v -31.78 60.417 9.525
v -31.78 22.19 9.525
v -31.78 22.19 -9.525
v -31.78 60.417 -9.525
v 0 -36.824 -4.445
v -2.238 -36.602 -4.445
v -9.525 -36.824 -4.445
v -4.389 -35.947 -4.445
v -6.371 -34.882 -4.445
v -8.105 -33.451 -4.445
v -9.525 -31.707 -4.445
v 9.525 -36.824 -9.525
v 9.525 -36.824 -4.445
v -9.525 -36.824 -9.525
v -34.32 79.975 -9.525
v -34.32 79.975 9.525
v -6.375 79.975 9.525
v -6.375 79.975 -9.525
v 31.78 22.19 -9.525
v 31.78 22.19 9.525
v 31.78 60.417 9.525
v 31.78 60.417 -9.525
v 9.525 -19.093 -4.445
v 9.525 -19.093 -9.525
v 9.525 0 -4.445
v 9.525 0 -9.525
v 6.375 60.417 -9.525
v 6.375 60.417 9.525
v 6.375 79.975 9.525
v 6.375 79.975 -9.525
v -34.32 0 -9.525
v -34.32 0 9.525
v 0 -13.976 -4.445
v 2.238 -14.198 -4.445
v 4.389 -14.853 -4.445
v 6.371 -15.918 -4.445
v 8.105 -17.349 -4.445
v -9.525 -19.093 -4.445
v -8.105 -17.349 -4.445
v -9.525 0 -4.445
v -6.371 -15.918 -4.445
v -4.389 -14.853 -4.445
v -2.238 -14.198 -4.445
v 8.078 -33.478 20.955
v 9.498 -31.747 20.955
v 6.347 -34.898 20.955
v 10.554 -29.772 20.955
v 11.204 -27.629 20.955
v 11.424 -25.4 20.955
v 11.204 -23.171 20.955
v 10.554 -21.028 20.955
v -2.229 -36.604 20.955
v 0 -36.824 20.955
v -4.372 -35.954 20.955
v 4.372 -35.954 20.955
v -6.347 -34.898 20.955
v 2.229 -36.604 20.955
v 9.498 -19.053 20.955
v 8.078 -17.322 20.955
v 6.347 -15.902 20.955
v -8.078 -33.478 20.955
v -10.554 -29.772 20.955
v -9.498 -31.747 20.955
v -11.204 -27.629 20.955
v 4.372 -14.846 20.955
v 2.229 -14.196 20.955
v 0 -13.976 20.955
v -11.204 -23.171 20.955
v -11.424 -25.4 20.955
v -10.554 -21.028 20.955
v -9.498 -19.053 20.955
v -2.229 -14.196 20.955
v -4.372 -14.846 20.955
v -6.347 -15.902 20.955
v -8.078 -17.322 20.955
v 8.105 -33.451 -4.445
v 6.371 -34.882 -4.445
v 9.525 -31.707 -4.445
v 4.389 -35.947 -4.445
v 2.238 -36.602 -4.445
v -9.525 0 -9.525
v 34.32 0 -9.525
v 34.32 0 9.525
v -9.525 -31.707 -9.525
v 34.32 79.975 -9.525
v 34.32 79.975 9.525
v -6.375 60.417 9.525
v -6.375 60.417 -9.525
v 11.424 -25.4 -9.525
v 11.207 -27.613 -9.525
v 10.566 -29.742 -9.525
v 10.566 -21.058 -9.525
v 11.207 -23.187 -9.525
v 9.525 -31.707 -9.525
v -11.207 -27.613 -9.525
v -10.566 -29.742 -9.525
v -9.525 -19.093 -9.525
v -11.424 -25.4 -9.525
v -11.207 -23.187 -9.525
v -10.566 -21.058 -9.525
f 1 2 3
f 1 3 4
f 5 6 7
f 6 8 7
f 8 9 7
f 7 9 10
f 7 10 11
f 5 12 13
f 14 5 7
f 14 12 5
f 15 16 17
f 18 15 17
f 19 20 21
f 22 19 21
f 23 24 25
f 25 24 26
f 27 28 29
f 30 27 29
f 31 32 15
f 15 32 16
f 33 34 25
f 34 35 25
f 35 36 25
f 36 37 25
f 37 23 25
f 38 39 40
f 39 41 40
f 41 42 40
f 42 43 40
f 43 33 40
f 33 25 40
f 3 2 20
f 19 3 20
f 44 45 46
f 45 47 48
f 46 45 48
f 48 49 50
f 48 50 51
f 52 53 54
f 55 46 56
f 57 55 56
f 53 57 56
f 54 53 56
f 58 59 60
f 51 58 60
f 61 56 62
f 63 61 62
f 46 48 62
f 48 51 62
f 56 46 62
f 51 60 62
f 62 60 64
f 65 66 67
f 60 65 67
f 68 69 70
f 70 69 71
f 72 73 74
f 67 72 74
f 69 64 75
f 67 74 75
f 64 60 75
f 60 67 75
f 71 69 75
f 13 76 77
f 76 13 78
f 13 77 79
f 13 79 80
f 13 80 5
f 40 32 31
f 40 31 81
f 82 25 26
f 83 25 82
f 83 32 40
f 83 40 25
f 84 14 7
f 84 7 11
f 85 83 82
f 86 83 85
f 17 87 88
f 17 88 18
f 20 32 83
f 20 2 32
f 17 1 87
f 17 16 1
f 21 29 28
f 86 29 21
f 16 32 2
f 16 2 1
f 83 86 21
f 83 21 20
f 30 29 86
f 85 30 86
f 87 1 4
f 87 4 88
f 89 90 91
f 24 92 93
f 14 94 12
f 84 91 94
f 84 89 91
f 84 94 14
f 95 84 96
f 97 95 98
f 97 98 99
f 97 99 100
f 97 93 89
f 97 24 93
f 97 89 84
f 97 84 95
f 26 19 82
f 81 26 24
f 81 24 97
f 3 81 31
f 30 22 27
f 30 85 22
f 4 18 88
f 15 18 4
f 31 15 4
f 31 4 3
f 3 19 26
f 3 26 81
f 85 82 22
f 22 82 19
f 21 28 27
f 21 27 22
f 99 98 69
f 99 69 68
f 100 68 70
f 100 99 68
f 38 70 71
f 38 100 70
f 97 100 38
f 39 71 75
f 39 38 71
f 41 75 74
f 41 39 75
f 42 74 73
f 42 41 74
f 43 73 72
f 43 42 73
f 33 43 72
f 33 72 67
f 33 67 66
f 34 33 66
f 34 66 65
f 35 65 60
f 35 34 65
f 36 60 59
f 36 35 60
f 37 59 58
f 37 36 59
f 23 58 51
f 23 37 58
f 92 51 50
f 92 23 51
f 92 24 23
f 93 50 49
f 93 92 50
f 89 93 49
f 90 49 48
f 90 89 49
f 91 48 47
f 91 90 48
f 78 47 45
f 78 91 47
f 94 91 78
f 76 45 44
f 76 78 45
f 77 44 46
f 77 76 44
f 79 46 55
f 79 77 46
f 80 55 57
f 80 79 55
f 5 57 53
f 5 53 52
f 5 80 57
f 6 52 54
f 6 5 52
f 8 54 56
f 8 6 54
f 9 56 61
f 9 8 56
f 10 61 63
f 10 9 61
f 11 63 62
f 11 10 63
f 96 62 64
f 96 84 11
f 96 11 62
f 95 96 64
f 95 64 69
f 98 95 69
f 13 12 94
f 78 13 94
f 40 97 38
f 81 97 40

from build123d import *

# Parameters (mm, degrees)
SKETCH1_W            = 68.64096
SKETCH1_H            = 79.975020836
MAIN_BODY_DEPTH      = 9.525
SKETCH2_W            = 63.56096
SKETCH2_H            = 38.227
LOWER_T_CAVITY_DEPTH = 90.088729956
SKETCH3_W            = 12.7508
SKETCH3_H            = 19.558
TOP_SLOT_DEPTH       = 90.088729956
SKETCH4_W            = 19.05
SKETCH4_H            = 36.82365
HANGER_DEPTH         = 5.08
SKETCH5_R            = 11.42365
STRAP_PIN_DEPTH      = 30.48


with BuildPart() as part:
    # Sketch1 → Main-Body (new, symmetric)
    with BuildSketch(Plane.XY):
        with Locations((0, 39.987510418)):
            Rectangle(SKETCH1_W, SKETCH1_H)
    extrude(amount=MAIN_BODY_DEPTH, both=True)

    # Sketch2 → Lower-T-Cavity (cut, through all)
    with BuildSketch(Plane.XY.offset(9.525)):
        with Locations((0, 41.303520836)):
            Rectangle(SKETCH2_W, SKETCH2_H)
    extrude(amount=-LOWER_T_CAVITY_DEPTH, mode=Mode.SUBTRACT)

    # Sketch3 → Top-Slot (cut, through all)
    with BuildSketch(Plane.XY.offset(9.525)):
        with Locations((0, 70.196020836)):
            Rectangle(SKETCH3_W, SKETCH3_H)
    extrude(amount=-TOP_SLOT_DEPTH, mode=Mode.SUBTRACT)

    # Sketch4 → Hanger (add)
    with BuildSketch(Plane(origin=(0, 0, -9.525), x_dir=(-1, 0, 0), z_dir=(0, 0, -1))):
        with Locations((0, -18.411825)):
            Rectangle(SKETCH4_W, SKETCH4_H)
    extrude(amount=-HANGER_DEPTH)

    # Sketch5 → Strap-Pin (add)
    with BuildSketch(Plane(origin=(0, 0, -9.525), x_dir=(-1, 0, 0), z_dir=(0, 0, -1))):
        with Locations((0, -25.4)):
            Circle(SKETCH5_R)
    extrude(amount=-STRAP_PIN_DEPTH)


solid = part.part
